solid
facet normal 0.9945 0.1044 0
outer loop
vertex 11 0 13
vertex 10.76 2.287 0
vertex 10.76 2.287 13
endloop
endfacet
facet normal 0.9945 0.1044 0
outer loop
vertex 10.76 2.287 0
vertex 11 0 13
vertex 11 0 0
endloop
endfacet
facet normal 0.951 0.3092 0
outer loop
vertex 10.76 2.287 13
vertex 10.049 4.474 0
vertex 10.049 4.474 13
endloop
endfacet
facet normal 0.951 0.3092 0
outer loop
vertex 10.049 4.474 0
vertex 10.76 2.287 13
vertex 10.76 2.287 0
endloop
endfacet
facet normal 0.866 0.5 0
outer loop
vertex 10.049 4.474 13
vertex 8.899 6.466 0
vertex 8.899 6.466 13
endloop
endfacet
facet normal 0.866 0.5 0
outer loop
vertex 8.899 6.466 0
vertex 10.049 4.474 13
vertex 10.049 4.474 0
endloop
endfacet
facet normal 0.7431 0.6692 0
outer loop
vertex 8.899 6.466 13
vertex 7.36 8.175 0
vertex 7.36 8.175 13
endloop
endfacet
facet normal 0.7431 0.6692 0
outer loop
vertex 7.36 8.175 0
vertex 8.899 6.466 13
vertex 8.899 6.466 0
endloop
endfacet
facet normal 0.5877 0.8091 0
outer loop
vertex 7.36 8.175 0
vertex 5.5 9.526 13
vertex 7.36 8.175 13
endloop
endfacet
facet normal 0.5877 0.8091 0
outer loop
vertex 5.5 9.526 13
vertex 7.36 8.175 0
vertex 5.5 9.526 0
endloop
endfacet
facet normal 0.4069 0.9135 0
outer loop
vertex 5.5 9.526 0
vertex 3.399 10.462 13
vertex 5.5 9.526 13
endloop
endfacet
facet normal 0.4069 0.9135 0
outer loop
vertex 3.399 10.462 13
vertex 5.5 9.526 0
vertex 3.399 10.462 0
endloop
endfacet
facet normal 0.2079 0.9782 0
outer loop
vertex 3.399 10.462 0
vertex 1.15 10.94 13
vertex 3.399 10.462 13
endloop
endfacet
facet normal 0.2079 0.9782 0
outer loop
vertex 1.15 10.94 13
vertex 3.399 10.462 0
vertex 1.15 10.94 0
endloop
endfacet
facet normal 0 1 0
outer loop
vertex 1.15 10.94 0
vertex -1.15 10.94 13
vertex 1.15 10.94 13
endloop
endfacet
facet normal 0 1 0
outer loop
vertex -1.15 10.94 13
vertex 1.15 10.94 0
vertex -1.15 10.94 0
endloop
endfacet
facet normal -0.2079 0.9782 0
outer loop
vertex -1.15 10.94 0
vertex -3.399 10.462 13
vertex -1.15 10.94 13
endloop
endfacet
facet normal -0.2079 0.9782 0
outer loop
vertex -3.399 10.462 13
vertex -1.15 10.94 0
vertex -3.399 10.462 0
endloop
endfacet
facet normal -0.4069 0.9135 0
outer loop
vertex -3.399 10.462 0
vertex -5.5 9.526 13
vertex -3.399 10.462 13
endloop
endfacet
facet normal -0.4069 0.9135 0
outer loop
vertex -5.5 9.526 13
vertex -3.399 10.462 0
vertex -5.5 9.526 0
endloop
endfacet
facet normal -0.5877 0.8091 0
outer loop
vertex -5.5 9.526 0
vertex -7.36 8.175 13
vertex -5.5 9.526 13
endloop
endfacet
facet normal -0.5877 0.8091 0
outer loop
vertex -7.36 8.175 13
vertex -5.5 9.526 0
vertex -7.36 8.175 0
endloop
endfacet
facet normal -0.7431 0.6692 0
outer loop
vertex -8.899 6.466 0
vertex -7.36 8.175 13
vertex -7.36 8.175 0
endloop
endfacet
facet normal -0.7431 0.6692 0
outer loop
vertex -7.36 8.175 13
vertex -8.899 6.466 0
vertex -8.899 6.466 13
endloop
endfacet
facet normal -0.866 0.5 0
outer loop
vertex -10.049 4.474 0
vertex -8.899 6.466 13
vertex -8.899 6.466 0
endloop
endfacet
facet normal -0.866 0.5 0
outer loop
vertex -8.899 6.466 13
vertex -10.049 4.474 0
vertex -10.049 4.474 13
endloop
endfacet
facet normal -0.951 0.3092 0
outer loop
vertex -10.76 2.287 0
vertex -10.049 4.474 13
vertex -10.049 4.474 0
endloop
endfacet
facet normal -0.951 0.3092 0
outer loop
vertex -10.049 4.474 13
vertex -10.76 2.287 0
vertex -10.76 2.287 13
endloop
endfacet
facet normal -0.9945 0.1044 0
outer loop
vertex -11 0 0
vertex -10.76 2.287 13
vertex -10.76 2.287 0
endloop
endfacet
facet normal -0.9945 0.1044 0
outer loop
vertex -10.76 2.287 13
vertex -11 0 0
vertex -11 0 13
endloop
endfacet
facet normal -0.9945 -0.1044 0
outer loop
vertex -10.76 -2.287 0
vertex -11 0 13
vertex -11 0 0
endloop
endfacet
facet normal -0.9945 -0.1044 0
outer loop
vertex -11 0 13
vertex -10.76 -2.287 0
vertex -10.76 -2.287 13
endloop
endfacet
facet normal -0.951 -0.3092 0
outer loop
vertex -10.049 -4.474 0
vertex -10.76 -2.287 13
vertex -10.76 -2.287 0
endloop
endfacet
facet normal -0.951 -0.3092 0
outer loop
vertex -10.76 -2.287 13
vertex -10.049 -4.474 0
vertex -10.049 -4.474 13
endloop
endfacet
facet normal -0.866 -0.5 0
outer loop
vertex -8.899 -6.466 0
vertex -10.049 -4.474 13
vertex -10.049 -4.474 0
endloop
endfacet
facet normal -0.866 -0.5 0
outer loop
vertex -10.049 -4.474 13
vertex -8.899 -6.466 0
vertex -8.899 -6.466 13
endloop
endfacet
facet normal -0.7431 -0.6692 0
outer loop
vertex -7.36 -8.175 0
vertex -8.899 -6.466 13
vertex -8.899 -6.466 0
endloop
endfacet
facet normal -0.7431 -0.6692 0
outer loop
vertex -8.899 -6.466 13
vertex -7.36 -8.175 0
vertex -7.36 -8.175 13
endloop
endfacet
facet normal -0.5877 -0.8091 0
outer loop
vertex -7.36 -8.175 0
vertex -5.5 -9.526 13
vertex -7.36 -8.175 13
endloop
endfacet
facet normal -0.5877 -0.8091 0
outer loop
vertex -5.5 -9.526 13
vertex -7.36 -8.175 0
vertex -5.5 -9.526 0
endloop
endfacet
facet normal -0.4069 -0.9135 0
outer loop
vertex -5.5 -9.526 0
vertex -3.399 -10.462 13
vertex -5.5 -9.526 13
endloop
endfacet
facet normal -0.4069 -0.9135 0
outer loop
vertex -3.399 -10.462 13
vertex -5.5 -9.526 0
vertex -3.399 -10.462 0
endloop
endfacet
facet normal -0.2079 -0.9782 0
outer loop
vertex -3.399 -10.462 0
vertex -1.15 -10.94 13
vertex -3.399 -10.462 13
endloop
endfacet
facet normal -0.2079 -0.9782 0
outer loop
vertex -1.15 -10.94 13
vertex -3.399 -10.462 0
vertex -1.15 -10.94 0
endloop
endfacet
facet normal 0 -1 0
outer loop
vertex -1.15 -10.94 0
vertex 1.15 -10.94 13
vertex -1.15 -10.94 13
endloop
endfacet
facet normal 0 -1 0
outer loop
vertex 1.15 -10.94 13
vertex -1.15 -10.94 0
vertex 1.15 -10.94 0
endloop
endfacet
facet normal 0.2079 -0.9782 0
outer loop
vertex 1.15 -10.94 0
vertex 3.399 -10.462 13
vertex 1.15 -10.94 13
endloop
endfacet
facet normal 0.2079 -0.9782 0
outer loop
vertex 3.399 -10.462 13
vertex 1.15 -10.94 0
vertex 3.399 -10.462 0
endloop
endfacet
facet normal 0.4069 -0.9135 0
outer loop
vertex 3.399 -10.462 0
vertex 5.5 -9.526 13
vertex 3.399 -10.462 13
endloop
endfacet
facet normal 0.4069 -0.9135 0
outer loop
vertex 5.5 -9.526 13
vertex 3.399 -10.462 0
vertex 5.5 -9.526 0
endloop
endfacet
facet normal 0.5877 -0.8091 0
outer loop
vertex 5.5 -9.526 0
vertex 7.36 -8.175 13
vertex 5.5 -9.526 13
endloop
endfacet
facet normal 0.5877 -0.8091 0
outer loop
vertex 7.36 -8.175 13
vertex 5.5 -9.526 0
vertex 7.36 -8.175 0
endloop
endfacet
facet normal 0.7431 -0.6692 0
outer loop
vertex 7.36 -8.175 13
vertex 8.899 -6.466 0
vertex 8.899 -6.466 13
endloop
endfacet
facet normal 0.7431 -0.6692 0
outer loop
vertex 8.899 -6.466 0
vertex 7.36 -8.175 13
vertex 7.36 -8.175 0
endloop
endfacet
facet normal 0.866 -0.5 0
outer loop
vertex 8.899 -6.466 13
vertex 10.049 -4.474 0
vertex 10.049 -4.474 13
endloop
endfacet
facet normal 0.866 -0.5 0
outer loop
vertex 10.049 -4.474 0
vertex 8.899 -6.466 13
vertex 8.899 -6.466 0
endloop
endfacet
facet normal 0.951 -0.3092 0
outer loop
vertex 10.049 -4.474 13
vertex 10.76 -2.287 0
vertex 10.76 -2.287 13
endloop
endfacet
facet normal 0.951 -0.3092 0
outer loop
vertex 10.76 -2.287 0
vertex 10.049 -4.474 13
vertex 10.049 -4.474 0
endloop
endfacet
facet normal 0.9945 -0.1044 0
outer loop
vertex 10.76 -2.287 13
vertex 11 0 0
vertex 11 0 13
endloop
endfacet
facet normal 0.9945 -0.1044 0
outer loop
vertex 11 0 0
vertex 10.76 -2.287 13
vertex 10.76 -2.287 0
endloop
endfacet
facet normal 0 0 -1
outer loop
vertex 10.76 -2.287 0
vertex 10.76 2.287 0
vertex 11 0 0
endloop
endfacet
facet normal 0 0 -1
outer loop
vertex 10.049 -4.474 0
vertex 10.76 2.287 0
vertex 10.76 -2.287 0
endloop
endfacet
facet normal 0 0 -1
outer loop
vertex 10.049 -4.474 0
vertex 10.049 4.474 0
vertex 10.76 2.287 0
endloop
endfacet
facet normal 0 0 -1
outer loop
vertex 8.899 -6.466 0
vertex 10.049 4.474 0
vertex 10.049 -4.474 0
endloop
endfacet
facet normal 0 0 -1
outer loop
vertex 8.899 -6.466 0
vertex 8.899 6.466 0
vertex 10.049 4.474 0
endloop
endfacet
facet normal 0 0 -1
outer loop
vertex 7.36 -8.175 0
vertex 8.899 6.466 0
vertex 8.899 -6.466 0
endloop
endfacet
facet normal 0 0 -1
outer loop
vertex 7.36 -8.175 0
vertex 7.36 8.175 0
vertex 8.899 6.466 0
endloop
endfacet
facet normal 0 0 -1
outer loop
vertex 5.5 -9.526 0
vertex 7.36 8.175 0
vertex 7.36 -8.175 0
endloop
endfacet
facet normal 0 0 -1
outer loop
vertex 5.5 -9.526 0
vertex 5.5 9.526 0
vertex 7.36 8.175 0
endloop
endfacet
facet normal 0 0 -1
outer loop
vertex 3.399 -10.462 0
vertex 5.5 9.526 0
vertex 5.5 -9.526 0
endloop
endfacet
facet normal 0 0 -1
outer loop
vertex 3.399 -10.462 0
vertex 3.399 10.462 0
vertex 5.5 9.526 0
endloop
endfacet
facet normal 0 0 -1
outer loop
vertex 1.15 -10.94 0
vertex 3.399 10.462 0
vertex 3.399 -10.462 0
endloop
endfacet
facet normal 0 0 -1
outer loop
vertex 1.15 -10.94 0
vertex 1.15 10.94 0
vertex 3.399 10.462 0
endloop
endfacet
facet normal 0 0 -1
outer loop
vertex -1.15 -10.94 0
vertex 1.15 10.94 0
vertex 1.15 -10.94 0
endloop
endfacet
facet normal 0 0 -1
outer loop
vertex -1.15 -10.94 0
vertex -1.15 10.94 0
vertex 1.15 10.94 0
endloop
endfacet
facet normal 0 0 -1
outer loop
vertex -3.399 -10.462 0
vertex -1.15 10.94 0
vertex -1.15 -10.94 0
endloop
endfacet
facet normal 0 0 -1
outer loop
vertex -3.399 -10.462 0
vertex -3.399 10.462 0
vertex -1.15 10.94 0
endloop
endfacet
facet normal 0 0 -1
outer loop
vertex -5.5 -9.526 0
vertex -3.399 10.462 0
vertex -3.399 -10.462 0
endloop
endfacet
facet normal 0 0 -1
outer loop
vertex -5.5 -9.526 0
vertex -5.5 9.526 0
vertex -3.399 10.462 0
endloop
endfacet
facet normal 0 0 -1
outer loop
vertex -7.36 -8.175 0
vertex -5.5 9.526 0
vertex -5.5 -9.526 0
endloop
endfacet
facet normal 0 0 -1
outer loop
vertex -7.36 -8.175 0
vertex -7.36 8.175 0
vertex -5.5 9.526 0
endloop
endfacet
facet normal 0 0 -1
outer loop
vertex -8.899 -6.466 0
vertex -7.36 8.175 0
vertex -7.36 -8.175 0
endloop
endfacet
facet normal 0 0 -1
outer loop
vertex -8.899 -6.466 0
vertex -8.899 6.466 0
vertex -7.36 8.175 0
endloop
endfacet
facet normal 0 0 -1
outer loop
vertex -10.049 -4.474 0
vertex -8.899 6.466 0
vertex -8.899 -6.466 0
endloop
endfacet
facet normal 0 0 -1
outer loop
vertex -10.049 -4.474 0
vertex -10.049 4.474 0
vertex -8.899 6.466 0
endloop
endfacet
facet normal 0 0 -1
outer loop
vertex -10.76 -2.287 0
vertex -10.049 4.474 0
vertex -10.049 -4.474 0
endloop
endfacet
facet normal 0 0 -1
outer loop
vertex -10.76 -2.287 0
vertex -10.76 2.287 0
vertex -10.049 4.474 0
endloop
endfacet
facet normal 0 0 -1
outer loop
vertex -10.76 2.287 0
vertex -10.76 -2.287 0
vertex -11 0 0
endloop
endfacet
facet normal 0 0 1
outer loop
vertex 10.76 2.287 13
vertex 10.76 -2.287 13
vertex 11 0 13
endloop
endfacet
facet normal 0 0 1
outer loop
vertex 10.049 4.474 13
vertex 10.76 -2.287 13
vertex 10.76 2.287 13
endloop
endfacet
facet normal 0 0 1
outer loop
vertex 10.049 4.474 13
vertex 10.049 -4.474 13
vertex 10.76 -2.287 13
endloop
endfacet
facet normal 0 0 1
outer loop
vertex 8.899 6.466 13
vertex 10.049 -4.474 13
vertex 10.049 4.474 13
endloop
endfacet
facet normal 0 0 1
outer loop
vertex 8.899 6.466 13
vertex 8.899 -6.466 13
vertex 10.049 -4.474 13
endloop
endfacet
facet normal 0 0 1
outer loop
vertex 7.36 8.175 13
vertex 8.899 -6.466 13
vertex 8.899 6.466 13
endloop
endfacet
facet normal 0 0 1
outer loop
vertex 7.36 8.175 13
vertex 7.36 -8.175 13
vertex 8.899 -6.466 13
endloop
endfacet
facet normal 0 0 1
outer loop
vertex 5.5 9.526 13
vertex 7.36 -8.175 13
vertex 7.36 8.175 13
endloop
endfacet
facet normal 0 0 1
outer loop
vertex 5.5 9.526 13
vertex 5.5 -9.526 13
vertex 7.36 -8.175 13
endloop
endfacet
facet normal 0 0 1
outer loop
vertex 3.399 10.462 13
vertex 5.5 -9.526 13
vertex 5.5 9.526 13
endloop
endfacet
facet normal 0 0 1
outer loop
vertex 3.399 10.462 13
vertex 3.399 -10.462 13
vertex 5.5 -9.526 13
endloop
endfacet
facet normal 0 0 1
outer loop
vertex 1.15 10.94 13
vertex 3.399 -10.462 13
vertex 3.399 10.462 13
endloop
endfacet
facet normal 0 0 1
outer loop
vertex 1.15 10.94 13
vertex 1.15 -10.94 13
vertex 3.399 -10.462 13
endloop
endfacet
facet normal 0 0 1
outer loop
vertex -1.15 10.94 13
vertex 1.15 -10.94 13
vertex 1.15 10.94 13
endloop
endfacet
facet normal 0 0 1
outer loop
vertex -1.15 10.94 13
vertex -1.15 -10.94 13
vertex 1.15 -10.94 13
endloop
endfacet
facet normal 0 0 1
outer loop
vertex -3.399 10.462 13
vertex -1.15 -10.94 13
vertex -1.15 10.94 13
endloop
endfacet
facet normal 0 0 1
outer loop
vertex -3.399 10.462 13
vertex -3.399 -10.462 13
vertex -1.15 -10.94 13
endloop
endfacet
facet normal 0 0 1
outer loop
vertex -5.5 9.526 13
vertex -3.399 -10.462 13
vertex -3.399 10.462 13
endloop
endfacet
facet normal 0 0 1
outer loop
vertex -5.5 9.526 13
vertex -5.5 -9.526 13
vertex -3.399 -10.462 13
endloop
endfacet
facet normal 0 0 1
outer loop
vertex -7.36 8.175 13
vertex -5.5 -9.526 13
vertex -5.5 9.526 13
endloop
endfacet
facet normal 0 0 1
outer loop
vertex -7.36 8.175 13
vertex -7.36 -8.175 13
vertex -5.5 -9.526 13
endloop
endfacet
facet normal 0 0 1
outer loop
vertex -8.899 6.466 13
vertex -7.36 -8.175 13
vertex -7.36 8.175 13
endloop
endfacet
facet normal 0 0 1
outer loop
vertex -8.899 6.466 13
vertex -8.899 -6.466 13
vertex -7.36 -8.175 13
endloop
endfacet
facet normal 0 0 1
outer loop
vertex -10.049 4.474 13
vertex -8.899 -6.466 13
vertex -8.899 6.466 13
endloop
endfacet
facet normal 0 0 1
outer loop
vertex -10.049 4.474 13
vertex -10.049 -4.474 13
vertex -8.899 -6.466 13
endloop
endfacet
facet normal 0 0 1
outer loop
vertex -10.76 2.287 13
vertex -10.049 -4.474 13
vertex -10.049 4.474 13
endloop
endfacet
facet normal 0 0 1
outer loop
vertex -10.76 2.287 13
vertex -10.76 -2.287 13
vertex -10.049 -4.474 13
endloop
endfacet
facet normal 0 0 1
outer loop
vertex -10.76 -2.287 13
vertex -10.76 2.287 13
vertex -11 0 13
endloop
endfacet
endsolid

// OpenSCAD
// Generated by SolidPython 1.0.1 on 2020-07-29 00:46:44


cylinder(h = 13, r1 = 11, r2 = 11);
/***********************************************
*********      SolidPython code:      **********
************************************************
 
# import packages: SolidPython
from solid import *
from solid.utils import *
from itertools import chain, combinations, permutations


class Resize:

    def __init__(self, scad_file):
        self.scad_file = scad_file
        #self.scad_file = import_scad(scad_file)
        # cone/cylinder param:
        self.r1 = 0
        self.r2 = 0
        self.h = 0
        # rectangular prism param:
        self.w = 0
        self.l = 0
        # ellipse param:
        self.r = 0

    # import OpenScad code (file name corresponds to shape)


    # classify shape + parameters
    def assign(self, param1, param2, param3):
        if self.scad_file == 'cone.scad':
            self.r1 = param1
            self.r2 = param2
            self.h = param3
        elif self.scad_file == 'cylinder.scad':
            self.r1 = param1
            self.r2 = param2
            self.h = param3
        elif self.scad_file == 'rectangularPrism.scad':
            self.h = param1
            self.l = param2
            self.w = param3
        else:
            self.r = param1
            self.h = param2

    # resize parameters
    def iterate(self):
        x = range(3, 20, 2)
        i = 1
        if self.scad_file == 'cone.scad':
            tempList = list(permutations(x, 2))
            for temp in tempList:
                param1 = temp[0]
                param2 = temp[1]
                filepath = 'produced_scad_files/' + 'cone' + str(param1) + '_' + str(param2) + '_' + '.scad'
                scad_render_to_file(cylinder(h=param1, r1=param2, r2=0), filepath)

        elif self.scad_file == 'cylinder.scad':
            tempList = list(permutations(x, 3))
            for temp in tempList:
                param1 = temp[0]
                param2 = temp[1]
                filepath = 'produced_scad_files/' + 'cylinder' + str(param1) + '_' + str(param2) + '_' + '.scad'
                scad_render_to_file(cylinder(h=param1, r1=param2, r2=param2), filepath)

        elif self.scad_file == 'rectangularPrism.scad':
            tempList = list(permutations(x, 3))
            for temp in tempList:
                param1 = temp[0]
                param2 = temp[1]
                param3 = temp[2]
                filepath = 'produced_scad_files/' + 'rectangularPrism' + str(param1) + '_' + str(param2) + '_' + str(
                    param3) + '.scad'
                scad_render_to_file(cube(size=(param1, param2, param3)), filepath)

        elif self.scad_file == 'ellipse.scad':
            tempList = list(permutations(x, 4))
            for temp in tempList:
                param1 = temp[0]
                param2 = temp[1]
                param3 = temp[2]
                param4 = temp[3]
                filepath = 'produced_scad_files/' + 'ellipse' + str(param1) + '_' + str(param2) + '_' + str(param3) + '_' + str(param4) + '.scad'
                scad_render_to_file(scale([param1, param2, param3])(sphere(r=param4)), filepath)

    def render_to_scadfile(self):
        scad_render_to_file(scad, 'example.scad') 
 
************************************************/
